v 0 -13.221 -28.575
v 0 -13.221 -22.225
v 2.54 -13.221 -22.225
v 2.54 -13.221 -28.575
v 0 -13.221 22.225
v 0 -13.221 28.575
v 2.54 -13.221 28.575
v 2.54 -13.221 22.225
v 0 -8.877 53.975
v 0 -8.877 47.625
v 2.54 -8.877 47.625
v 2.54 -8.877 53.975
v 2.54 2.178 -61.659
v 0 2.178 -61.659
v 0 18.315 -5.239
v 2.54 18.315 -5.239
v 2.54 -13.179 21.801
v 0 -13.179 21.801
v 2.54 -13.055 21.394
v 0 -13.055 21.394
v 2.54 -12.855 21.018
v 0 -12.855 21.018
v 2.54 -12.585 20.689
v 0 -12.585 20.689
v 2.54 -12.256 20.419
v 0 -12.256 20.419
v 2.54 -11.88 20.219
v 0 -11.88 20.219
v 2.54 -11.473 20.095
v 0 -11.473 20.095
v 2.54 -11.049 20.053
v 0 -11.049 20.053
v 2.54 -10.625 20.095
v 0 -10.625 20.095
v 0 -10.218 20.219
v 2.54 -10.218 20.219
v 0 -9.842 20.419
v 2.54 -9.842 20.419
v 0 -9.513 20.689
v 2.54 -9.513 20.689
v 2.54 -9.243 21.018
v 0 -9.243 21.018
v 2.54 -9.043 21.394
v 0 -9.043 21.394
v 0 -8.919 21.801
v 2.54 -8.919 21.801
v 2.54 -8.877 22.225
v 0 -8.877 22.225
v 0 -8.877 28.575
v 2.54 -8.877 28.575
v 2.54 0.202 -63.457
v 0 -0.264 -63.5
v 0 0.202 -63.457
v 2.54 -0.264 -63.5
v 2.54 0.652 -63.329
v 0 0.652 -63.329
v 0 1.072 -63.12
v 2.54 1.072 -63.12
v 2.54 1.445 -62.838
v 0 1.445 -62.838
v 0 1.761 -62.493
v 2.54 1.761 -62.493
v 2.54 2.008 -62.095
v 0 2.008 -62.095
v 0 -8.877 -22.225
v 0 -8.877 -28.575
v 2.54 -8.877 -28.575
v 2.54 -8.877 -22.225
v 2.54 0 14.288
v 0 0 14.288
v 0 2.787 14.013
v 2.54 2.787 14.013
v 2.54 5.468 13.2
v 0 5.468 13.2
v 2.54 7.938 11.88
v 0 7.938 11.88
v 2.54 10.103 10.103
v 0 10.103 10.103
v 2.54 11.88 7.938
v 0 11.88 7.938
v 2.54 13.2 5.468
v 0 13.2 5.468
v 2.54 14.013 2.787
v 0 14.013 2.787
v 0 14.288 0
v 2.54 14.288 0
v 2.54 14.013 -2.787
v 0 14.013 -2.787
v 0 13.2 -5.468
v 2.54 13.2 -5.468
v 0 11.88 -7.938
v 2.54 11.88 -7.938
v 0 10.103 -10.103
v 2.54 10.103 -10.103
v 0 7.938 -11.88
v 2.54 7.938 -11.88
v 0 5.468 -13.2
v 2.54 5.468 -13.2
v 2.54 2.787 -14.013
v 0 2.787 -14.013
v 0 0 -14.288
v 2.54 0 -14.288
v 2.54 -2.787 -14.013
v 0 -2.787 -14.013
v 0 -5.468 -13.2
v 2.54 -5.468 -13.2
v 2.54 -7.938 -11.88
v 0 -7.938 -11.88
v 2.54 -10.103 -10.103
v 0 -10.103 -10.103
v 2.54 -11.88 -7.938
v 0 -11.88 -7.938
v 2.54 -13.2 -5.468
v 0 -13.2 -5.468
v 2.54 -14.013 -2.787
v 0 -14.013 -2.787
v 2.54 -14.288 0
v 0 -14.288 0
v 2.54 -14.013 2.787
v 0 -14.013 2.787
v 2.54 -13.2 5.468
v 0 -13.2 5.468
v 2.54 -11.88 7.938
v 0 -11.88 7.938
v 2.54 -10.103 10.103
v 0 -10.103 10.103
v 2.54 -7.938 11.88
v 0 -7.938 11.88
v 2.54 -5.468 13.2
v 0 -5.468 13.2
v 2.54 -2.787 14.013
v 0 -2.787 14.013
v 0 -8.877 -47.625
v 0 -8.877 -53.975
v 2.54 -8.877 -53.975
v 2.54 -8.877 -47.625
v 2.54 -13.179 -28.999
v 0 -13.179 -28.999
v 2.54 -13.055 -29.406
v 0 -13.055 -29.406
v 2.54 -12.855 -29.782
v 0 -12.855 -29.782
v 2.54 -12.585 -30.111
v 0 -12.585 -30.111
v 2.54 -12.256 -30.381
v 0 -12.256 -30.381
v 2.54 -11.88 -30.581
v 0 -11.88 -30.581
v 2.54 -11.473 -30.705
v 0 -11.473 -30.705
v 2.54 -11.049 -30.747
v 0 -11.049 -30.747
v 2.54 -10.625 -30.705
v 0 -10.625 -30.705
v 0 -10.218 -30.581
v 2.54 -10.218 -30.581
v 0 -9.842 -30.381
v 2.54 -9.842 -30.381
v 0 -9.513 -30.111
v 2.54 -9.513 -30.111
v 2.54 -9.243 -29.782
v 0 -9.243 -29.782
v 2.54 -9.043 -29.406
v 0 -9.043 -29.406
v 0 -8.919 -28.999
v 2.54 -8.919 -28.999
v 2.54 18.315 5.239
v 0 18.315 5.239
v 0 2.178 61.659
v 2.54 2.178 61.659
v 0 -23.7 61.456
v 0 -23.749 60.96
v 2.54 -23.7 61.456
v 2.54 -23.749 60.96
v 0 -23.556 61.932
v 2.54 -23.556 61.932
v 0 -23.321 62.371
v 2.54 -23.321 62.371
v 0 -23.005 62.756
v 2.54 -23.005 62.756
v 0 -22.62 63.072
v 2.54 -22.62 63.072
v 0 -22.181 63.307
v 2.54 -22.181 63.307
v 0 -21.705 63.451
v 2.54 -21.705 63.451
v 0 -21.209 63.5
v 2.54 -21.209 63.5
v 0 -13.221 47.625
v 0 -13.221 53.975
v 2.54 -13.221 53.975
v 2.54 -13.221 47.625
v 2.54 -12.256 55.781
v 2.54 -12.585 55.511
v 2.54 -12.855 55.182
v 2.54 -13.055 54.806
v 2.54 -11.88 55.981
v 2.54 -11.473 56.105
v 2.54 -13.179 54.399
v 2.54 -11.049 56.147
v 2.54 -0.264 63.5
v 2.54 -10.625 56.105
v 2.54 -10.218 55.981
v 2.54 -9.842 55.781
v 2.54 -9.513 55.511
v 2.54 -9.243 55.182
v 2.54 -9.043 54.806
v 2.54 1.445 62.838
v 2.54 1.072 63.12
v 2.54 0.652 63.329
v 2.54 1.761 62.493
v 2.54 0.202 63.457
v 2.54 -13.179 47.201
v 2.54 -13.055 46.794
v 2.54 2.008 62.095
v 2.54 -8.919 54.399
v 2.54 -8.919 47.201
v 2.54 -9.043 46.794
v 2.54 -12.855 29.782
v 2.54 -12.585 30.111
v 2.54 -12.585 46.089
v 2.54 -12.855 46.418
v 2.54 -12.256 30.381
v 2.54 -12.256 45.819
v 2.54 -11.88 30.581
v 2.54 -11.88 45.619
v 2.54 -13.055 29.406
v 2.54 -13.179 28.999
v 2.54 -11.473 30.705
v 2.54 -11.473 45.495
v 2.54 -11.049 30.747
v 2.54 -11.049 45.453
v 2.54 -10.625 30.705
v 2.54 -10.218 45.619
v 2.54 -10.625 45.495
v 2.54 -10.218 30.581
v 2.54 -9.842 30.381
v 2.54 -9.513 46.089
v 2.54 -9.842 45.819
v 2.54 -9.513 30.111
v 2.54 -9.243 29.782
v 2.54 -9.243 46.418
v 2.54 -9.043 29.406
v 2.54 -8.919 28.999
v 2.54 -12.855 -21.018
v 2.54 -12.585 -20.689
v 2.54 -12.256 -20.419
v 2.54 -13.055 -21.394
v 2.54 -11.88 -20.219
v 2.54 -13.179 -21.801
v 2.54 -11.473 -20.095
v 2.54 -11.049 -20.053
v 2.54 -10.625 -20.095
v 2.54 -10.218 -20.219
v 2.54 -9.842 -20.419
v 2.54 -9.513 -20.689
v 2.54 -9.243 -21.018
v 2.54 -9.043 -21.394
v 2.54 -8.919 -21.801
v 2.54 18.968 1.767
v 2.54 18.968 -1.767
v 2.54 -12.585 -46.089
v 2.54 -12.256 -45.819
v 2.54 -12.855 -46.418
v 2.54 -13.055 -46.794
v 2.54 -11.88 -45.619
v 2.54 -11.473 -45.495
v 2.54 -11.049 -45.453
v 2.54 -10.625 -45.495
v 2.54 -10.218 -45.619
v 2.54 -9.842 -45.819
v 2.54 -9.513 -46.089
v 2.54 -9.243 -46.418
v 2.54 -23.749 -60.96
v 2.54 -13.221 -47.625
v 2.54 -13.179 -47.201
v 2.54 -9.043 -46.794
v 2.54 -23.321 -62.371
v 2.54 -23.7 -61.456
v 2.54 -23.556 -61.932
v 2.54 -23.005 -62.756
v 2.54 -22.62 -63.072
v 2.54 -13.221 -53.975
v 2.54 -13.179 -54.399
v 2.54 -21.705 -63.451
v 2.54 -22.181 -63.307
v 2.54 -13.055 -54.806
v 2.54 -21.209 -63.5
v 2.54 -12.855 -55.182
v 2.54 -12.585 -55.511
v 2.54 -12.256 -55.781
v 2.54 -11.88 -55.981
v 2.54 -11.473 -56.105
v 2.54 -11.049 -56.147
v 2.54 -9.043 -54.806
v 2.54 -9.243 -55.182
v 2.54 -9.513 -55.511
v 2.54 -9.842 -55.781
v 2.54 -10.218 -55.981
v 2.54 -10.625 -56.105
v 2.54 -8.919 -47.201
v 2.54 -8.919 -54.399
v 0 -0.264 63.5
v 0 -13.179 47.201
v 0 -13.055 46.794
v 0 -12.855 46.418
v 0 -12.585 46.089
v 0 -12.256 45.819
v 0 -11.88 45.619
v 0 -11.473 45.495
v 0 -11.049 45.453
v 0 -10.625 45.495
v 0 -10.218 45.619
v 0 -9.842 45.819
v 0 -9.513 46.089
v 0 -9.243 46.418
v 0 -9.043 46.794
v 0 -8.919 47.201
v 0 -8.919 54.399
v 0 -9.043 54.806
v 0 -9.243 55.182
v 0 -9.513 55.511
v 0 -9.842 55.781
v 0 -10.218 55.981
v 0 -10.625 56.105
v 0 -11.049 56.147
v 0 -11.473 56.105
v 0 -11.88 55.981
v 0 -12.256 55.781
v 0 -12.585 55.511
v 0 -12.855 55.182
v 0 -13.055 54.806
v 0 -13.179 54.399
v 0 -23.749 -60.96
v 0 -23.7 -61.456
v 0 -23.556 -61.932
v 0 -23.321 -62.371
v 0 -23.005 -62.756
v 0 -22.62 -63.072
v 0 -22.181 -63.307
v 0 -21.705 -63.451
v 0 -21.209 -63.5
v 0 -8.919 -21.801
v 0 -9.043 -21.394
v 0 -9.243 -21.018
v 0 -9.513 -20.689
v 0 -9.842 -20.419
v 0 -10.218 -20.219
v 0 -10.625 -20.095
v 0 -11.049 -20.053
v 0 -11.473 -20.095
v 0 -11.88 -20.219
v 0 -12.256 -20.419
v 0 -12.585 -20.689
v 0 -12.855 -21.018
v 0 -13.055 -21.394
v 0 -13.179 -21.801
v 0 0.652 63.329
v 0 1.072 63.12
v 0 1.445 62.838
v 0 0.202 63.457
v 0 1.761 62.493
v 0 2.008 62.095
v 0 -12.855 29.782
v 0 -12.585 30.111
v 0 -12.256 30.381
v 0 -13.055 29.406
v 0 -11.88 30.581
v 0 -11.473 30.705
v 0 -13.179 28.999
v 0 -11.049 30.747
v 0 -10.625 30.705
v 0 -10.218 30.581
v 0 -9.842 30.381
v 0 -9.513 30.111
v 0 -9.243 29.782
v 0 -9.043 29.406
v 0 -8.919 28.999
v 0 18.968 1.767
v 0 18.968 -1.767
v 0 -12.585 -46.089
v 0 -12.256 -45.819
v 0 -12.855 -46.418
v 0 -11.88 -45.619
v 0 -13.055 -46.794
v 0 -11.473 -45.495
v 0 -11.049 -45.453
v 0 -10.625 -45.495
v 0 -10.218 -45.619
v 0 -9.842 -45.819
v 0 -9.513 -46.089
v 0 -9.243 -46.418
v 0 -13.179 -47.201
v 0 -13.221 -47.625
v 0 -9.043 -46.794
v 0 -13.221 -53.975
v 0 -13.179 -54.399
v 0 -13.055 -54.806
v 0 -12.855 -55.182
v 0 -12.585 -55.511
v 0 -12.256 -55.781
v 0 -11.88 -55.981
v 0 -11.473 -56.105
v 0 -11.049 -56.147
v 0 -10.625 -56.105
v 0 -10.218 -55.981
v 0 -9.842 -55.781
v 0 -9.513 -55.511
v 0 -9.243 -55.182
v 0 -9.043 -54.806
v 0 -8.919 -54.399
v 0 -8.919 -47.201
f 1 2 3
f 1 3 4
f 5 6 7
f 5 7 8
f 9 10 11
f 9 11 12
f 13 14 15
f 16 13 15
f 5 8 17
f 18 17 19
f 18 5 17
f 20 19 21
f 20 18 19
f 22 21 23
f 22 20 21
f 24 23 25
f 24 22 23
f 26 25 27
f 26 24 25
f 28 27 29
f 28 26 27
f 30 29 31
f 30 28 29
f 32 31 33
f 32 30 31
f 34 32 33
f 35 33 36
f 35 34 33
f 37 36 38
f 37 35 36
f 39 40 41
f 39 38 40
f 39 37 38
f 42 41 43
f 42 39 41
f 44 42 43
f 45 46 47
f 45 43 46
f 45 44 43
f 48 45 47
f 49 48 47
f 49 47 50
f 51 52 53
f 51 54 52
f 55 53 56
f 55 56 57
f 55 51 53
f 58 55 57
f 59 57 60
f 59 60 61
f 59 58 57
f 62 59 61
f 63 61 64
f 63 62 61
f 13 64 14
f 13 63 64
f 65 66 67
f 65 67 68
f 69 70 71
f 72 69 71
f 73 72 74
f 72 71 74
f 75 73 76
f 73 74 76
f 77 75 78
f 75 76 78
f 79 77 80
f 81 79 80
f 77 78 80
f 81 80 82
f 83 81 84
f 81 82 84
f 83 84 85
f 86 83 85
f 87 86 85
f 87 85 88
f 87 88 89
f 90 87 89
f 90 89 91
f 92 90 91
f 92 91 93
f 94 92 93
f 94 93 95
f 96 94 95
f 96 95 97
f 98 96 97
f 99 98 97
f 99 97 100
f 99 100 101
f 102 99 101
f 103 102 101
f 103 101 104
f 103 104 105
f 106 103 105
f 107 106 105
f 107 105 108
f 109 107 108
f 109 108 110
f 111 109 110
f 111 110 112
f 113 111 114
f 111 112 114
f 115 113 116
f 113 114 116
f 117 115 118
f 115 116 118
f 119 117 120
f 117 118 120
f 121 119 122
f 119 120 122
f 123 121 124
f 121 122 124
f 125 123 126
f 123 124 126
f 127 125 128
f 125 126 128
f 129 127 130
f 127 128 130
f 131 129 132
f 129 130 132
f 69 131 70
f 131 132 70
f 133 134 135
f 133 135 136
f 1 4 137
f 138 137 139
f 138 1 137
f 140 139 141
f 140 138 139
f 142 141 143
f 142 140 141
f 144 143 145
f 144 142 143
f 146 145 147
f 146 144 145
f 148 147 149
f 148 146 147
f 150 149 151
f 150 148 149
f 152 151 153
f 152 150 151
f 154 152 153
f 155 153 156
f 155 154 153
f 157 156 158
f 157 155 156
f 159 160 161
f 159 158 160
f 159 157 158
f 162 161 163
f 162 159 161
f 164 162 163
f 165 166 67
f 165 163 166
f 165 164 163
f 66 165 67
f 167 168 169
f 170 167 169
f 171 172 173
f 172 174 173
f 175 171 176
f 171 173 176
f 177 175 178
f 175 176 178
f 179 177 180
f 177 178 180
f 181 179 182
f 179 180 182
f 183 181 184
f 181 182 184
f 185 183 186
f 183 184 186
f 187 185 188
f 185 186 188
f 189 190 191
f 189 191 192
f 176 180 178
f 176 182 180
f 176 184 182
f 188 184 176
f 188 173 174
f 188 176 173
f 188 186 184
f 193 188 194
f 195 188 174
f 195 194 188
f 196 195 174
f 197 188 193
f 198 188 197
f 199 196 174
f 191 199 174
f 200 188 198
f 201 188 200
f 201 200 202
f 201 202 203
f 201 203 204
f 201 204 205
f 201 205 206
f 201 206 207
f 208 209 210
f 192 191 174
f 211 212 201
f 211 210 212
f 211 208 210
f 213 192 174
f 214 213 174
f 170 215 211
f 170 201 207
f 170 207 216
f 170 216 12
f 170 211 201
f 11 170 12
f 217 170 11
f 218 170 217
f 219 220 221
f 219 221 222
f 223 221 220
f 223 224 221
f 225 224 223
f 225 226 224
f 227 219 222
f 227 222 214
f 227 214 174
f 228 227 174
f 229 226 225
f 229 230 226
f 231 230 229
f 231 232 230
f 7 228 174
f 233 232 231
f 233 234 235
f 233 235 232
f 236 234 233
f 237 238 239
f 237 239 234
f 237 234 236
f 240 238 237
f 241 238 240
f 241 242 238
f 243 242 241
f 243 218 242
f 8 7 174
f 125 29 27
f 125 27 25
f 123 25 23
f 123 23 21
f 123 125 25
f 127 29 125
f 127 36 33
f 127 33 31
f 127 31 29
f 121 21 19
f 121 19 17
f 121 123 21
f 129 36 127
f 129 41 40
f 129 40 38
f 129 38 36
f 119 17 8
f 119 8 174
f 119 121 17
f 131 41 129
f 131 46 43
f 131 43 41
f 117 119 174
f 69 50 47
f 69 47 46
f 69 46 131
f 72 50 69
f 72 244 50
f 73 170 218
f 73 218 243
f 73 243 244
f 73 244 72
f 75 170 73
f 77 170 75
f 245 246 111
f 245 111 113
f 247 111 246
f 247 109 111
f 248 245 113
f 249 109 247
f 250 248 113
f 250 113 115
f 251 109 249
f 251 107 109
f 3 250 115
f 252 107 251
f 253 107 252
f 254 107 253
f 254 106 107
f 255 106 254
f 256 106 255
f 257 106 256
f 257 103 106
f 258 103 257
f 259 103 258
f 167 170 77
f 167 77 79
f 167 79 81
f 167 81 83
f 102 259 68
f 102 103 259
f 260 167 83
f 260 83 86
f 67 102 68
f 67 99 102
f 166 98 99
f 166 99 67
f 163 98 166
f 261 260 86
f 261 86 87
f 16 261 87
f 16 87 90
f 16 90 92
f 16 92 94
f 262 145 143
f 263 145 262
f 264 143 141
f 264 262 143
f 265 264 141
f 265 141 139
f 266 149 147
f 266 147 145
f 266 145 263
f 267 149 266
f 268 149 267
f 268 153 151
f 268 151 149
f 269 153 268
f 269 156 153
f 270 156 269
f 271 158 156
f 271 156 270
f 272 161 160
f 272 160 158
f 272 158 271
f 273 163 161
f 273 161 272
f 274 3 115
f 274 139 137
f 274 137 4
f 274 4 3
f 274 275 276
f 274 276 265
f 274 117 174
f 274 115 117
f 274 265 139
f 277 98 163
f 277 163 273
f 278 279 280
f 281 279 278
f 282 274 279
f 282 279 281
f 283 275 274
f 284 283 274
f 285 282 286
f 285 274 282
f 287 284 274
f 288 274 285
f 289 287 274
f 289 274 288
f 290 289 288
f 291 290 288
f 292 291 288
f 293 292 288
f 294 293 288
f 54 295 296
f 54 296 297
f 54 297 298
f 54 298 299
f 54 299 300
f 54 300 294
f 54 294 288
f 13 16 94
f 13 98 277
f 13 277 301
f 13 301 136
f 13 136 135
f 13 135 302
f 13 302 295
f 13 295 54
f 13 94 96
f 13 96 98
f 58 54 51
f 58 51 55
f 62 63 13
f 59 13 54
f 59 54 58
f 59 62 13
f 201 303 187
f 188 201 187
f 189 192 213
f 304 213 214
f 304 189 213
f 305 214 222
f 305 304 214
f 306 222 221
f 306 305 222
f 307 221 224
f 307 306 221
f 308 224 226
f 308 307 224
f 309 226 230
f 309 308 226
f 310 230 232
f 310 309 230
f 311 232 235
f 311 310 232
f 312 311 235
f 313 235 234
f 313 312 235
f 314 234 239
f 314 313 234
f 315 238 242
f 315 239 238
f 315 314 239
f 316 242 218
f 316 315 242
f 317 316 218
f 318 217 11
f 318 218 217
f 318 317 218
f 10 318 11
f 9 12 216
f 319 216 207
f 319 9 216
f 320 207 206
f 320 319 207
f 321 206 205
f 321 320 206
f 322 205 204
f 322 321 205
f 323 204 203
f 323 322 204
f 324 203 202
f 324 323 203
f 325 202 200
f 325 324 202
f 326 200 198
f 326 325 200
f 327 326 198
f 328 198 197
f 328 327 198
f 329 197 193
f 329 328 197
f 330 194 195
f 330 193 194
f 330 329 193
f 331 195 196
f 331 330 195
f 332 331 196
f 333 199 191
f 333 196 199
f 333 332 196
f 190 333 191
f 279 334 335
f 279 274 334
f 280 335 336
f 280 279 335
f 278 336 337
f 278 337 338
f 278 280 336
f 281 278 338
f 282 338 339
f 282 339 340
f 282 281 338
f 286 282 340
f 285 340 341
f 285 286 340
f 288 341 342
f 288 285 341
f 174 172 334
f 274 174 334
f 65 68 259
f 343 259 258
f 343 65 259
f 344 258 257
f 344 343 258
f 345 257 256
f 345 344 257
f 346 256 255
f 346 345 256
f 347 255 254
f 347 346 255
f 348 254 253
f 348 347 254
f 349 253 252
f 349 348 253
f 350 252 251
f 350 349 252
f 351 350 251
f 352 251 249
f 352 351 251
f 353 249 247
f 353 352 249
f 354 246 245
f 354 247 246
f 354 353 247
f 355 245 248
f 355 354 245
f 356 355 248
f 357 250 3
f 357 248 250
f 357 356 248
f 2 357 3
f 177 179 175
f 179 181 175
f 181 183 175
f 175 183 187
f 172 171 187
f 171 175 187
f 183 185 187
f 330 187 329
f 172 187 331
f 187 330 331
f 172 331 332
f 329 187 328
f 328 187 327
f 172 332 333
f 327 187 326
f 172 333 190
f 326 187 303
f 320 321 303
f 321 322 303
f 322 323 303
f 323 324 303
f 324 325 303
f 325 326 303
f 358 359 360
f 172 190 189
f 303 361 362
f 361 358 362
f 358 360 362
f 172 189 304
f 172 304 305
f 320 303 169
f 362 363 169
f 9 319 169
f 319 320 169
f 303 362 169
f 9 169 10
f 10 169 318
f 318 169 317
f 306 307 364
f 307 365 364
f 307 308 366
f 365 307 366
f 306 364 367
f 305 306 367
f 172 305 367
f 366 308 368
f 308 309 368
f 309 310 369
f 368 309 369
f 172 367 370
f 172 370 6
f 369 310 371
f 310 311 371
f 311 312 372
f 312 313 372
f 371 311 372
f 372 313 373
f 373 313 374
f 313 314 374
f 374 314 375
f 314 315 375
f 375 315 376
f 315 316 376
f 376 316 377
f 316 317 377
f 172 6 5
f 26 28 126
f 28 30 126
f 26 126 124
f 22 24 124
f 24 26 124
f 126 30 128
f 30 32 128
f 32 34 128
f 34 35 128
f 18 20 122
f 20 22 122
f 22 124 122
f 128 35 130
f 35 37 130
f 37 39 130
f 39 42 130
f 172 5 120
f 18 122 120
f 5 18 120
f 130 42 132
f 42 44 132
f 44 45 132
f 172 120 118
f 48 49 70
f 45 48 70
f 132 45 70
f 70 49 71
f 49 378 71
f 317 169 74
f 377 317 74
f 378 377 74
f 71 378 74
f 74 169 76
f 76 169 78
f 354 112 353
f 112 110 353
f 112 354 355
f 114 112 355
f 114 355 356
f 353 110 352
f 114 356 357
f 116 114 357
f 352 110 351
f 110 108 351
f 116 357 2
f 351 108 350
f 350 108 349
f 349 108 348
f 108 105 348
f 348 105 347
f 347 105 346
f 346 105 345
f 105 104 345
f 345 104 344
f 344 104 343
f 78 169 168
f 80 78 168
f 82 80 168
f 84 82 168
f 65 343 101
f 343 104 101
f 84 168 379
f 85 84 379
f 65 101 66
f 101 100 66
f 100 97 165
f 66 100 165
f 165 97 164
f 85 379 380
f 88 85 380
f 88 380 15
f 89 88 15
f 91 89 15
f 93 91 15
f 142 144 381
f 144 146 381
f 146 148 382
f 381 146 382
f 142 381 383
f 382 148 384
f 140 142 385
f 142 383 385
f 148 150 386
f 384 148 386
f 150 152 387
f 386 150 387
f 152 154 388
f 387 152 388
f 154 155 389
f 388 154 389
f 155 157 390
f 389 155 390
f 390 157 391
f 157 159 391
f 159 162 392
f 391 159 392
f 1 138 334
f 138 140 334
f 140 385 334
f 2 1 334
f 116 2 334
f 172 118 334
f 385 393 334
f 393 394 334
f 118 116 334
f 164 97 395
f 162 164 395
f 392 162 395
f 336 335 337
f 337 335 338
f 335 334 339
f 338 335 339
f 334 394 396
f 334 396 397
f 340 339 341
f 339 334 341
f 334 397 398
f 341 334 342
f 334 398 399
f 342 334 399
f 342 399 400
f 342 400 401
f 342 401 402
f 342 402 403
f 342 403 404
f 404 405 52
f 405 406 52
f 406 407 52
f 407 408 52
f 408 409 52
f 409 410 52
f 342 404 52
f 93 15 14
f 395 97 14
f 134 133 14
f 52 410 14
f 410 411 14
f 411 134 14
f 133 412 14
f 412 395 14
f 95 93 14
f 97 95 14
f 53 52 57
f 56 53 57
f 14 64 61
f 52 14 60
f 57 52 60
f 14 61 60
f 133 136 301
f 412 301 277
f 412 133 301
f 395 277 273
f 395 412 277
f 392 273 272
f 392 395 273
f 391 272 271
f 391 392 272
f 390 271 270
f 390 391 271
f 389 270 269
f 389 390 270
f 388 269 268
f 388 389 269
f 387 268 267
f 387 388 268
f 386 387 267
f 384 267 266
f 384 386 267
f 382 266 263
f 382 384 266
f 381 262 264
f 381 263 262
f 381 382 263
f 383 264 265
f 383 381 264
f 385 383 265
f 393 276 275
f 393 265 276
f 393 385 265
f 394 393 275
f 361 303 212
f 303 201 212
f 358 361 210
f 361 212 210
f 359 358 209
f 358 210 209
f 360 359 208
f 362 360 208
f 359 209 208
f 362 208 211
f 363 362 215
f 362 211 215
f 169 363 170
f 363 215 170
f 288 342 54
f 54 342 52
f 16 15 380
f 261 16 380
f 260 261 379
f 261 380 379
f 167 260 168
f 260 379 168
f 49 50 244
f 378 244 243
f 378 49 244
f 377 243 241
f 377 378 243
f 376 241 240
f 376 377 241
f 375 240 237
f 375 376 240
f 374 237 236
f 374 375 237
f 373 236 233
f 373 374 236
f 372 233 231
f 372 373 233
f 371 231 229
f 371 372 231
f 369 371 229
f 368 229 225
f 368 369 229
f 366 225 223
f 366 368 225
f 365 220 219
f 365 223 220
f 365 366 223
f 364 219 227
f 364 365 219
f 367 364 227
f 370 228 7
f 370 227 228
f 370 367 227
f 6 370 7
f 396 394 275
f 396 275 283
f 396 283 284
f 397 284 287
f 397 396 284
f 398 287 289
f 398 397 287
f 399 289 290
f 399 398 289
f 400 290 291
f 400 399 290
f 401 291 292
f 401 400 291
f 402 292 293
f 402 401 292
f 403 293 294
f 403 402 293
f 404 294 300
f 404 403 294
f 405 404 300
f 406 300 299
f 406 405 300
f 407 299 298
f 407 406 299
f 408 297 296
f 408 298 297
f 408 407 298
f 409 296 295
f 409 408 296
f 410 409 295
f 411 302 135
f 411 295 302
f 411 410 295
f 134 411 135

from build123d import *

# Parameters (mm, degrees)
BOSS_EXTRUDE1_DEPTH = 2.54
SKETCH3_R           = 14.2875
CUT_EXTRUDE1_DEPTH  = 68.843323924
FILLET1_R           = 2.54


with BuildPart() as part:
    # Sketch1 → Boss-Extrude1 (new body)
    with BuildSketch(Plane(origin=(0, 0, 0), x_dir=(0, 0, -1), z_dir=(1, 0, 0))):
        with BuildLine():
            Line((-63.5, -23.749), (63.5, -23.749))
            Line((63.5, -23.749), (63.5, 1.651))
            Line((63.5, 1.651), (5.238797024, 18.315499058))
            ThreePointArc((5.238797024, 18.315499058), (0, 19.05), (-5.238797024, 18.315499058))
            Line((-5.238797024, 18.315499058), (-63.5, 1.651))
            Line((-63.5, 1.651), (-63.5, -23.749))
        make_face()
    extrude(amount=BOSS_EXTRUDE1_DEPTH)

    # Sketch3 → Cut-Extrude1 (cut, through all)
    with BuildSketch(Plane.ZY):
        Circle(SKETCH3_R)
        with BuildLine():
            Line((-53.975, -8.8773), (-47.625, -8.8773))
            ThreePointArc((-47.625, -8.8773), (-45.4533, -11.049), (-47.625, -13.2207))
            Line((-47.625, -13.2207), (-53.975, -13.2207))
            ThreePointArc((-53.975, -13.2207), (-56.1467, -11.049), (-53.975, -8.8773))
        make_face()
        with BuildLine():
            Line((-28.575, -8.8773), (-22.225, -8.8773))
            ThreePointArc((-22.225, -8.8773), (-20.0533, -11.049), (-22.225, -13.2207))
            Line((-22.225, -13.2207), (-28.575, -13.2207))
            ThreePointArc((-28.575, -13.2207), (-30.7467, -11.049), (-28.575, -8.8773))
        make_face()
        with BuildLine():
            Line((22.225, -8.8773), (28.575, -8.8773))
            ThreePointArc((28.575, -8.8773), (30.7467, -11.049), (28.575, -13.2207))
            Line((28.575, -13.2207), (22.225, -13.2207))
            ThreePointArc((22.225, -13.2207), (20.0533, -11.049), (22.225, -8.8773))
        make_face()
        with BuildLine():
            Line((47.625, -8.8773), (53.975, -8.8773))
            ThreePointArc((53.975, -8.8773), (56.1467, -11.049), (53.975, -13.2207))
            Line((53.975, -13.2207), (47.625, -13.2207))
            ThreePointArc((47.625, -13.2207), (45.4533, -11.049), (47.625, -8.8773))
        make_face()
    extrude(amount=-CUT_EXTRUDE1_DEPTH, mode=Mode.SUBTRACT)

    # Fillet1
    fillet1_edges = [part.edges().sort_by_distance(p)[0] for p in [
        (1.27, -23.749, 63.5),
        (1.27, 1.651, 63.5),
        (1.27, 1.651, -63.5),
        (1.27, -23.749, -63.5),
    ]]
    fillet(fillet1_edges, radius=FILLET1_R)


solid = part.part
